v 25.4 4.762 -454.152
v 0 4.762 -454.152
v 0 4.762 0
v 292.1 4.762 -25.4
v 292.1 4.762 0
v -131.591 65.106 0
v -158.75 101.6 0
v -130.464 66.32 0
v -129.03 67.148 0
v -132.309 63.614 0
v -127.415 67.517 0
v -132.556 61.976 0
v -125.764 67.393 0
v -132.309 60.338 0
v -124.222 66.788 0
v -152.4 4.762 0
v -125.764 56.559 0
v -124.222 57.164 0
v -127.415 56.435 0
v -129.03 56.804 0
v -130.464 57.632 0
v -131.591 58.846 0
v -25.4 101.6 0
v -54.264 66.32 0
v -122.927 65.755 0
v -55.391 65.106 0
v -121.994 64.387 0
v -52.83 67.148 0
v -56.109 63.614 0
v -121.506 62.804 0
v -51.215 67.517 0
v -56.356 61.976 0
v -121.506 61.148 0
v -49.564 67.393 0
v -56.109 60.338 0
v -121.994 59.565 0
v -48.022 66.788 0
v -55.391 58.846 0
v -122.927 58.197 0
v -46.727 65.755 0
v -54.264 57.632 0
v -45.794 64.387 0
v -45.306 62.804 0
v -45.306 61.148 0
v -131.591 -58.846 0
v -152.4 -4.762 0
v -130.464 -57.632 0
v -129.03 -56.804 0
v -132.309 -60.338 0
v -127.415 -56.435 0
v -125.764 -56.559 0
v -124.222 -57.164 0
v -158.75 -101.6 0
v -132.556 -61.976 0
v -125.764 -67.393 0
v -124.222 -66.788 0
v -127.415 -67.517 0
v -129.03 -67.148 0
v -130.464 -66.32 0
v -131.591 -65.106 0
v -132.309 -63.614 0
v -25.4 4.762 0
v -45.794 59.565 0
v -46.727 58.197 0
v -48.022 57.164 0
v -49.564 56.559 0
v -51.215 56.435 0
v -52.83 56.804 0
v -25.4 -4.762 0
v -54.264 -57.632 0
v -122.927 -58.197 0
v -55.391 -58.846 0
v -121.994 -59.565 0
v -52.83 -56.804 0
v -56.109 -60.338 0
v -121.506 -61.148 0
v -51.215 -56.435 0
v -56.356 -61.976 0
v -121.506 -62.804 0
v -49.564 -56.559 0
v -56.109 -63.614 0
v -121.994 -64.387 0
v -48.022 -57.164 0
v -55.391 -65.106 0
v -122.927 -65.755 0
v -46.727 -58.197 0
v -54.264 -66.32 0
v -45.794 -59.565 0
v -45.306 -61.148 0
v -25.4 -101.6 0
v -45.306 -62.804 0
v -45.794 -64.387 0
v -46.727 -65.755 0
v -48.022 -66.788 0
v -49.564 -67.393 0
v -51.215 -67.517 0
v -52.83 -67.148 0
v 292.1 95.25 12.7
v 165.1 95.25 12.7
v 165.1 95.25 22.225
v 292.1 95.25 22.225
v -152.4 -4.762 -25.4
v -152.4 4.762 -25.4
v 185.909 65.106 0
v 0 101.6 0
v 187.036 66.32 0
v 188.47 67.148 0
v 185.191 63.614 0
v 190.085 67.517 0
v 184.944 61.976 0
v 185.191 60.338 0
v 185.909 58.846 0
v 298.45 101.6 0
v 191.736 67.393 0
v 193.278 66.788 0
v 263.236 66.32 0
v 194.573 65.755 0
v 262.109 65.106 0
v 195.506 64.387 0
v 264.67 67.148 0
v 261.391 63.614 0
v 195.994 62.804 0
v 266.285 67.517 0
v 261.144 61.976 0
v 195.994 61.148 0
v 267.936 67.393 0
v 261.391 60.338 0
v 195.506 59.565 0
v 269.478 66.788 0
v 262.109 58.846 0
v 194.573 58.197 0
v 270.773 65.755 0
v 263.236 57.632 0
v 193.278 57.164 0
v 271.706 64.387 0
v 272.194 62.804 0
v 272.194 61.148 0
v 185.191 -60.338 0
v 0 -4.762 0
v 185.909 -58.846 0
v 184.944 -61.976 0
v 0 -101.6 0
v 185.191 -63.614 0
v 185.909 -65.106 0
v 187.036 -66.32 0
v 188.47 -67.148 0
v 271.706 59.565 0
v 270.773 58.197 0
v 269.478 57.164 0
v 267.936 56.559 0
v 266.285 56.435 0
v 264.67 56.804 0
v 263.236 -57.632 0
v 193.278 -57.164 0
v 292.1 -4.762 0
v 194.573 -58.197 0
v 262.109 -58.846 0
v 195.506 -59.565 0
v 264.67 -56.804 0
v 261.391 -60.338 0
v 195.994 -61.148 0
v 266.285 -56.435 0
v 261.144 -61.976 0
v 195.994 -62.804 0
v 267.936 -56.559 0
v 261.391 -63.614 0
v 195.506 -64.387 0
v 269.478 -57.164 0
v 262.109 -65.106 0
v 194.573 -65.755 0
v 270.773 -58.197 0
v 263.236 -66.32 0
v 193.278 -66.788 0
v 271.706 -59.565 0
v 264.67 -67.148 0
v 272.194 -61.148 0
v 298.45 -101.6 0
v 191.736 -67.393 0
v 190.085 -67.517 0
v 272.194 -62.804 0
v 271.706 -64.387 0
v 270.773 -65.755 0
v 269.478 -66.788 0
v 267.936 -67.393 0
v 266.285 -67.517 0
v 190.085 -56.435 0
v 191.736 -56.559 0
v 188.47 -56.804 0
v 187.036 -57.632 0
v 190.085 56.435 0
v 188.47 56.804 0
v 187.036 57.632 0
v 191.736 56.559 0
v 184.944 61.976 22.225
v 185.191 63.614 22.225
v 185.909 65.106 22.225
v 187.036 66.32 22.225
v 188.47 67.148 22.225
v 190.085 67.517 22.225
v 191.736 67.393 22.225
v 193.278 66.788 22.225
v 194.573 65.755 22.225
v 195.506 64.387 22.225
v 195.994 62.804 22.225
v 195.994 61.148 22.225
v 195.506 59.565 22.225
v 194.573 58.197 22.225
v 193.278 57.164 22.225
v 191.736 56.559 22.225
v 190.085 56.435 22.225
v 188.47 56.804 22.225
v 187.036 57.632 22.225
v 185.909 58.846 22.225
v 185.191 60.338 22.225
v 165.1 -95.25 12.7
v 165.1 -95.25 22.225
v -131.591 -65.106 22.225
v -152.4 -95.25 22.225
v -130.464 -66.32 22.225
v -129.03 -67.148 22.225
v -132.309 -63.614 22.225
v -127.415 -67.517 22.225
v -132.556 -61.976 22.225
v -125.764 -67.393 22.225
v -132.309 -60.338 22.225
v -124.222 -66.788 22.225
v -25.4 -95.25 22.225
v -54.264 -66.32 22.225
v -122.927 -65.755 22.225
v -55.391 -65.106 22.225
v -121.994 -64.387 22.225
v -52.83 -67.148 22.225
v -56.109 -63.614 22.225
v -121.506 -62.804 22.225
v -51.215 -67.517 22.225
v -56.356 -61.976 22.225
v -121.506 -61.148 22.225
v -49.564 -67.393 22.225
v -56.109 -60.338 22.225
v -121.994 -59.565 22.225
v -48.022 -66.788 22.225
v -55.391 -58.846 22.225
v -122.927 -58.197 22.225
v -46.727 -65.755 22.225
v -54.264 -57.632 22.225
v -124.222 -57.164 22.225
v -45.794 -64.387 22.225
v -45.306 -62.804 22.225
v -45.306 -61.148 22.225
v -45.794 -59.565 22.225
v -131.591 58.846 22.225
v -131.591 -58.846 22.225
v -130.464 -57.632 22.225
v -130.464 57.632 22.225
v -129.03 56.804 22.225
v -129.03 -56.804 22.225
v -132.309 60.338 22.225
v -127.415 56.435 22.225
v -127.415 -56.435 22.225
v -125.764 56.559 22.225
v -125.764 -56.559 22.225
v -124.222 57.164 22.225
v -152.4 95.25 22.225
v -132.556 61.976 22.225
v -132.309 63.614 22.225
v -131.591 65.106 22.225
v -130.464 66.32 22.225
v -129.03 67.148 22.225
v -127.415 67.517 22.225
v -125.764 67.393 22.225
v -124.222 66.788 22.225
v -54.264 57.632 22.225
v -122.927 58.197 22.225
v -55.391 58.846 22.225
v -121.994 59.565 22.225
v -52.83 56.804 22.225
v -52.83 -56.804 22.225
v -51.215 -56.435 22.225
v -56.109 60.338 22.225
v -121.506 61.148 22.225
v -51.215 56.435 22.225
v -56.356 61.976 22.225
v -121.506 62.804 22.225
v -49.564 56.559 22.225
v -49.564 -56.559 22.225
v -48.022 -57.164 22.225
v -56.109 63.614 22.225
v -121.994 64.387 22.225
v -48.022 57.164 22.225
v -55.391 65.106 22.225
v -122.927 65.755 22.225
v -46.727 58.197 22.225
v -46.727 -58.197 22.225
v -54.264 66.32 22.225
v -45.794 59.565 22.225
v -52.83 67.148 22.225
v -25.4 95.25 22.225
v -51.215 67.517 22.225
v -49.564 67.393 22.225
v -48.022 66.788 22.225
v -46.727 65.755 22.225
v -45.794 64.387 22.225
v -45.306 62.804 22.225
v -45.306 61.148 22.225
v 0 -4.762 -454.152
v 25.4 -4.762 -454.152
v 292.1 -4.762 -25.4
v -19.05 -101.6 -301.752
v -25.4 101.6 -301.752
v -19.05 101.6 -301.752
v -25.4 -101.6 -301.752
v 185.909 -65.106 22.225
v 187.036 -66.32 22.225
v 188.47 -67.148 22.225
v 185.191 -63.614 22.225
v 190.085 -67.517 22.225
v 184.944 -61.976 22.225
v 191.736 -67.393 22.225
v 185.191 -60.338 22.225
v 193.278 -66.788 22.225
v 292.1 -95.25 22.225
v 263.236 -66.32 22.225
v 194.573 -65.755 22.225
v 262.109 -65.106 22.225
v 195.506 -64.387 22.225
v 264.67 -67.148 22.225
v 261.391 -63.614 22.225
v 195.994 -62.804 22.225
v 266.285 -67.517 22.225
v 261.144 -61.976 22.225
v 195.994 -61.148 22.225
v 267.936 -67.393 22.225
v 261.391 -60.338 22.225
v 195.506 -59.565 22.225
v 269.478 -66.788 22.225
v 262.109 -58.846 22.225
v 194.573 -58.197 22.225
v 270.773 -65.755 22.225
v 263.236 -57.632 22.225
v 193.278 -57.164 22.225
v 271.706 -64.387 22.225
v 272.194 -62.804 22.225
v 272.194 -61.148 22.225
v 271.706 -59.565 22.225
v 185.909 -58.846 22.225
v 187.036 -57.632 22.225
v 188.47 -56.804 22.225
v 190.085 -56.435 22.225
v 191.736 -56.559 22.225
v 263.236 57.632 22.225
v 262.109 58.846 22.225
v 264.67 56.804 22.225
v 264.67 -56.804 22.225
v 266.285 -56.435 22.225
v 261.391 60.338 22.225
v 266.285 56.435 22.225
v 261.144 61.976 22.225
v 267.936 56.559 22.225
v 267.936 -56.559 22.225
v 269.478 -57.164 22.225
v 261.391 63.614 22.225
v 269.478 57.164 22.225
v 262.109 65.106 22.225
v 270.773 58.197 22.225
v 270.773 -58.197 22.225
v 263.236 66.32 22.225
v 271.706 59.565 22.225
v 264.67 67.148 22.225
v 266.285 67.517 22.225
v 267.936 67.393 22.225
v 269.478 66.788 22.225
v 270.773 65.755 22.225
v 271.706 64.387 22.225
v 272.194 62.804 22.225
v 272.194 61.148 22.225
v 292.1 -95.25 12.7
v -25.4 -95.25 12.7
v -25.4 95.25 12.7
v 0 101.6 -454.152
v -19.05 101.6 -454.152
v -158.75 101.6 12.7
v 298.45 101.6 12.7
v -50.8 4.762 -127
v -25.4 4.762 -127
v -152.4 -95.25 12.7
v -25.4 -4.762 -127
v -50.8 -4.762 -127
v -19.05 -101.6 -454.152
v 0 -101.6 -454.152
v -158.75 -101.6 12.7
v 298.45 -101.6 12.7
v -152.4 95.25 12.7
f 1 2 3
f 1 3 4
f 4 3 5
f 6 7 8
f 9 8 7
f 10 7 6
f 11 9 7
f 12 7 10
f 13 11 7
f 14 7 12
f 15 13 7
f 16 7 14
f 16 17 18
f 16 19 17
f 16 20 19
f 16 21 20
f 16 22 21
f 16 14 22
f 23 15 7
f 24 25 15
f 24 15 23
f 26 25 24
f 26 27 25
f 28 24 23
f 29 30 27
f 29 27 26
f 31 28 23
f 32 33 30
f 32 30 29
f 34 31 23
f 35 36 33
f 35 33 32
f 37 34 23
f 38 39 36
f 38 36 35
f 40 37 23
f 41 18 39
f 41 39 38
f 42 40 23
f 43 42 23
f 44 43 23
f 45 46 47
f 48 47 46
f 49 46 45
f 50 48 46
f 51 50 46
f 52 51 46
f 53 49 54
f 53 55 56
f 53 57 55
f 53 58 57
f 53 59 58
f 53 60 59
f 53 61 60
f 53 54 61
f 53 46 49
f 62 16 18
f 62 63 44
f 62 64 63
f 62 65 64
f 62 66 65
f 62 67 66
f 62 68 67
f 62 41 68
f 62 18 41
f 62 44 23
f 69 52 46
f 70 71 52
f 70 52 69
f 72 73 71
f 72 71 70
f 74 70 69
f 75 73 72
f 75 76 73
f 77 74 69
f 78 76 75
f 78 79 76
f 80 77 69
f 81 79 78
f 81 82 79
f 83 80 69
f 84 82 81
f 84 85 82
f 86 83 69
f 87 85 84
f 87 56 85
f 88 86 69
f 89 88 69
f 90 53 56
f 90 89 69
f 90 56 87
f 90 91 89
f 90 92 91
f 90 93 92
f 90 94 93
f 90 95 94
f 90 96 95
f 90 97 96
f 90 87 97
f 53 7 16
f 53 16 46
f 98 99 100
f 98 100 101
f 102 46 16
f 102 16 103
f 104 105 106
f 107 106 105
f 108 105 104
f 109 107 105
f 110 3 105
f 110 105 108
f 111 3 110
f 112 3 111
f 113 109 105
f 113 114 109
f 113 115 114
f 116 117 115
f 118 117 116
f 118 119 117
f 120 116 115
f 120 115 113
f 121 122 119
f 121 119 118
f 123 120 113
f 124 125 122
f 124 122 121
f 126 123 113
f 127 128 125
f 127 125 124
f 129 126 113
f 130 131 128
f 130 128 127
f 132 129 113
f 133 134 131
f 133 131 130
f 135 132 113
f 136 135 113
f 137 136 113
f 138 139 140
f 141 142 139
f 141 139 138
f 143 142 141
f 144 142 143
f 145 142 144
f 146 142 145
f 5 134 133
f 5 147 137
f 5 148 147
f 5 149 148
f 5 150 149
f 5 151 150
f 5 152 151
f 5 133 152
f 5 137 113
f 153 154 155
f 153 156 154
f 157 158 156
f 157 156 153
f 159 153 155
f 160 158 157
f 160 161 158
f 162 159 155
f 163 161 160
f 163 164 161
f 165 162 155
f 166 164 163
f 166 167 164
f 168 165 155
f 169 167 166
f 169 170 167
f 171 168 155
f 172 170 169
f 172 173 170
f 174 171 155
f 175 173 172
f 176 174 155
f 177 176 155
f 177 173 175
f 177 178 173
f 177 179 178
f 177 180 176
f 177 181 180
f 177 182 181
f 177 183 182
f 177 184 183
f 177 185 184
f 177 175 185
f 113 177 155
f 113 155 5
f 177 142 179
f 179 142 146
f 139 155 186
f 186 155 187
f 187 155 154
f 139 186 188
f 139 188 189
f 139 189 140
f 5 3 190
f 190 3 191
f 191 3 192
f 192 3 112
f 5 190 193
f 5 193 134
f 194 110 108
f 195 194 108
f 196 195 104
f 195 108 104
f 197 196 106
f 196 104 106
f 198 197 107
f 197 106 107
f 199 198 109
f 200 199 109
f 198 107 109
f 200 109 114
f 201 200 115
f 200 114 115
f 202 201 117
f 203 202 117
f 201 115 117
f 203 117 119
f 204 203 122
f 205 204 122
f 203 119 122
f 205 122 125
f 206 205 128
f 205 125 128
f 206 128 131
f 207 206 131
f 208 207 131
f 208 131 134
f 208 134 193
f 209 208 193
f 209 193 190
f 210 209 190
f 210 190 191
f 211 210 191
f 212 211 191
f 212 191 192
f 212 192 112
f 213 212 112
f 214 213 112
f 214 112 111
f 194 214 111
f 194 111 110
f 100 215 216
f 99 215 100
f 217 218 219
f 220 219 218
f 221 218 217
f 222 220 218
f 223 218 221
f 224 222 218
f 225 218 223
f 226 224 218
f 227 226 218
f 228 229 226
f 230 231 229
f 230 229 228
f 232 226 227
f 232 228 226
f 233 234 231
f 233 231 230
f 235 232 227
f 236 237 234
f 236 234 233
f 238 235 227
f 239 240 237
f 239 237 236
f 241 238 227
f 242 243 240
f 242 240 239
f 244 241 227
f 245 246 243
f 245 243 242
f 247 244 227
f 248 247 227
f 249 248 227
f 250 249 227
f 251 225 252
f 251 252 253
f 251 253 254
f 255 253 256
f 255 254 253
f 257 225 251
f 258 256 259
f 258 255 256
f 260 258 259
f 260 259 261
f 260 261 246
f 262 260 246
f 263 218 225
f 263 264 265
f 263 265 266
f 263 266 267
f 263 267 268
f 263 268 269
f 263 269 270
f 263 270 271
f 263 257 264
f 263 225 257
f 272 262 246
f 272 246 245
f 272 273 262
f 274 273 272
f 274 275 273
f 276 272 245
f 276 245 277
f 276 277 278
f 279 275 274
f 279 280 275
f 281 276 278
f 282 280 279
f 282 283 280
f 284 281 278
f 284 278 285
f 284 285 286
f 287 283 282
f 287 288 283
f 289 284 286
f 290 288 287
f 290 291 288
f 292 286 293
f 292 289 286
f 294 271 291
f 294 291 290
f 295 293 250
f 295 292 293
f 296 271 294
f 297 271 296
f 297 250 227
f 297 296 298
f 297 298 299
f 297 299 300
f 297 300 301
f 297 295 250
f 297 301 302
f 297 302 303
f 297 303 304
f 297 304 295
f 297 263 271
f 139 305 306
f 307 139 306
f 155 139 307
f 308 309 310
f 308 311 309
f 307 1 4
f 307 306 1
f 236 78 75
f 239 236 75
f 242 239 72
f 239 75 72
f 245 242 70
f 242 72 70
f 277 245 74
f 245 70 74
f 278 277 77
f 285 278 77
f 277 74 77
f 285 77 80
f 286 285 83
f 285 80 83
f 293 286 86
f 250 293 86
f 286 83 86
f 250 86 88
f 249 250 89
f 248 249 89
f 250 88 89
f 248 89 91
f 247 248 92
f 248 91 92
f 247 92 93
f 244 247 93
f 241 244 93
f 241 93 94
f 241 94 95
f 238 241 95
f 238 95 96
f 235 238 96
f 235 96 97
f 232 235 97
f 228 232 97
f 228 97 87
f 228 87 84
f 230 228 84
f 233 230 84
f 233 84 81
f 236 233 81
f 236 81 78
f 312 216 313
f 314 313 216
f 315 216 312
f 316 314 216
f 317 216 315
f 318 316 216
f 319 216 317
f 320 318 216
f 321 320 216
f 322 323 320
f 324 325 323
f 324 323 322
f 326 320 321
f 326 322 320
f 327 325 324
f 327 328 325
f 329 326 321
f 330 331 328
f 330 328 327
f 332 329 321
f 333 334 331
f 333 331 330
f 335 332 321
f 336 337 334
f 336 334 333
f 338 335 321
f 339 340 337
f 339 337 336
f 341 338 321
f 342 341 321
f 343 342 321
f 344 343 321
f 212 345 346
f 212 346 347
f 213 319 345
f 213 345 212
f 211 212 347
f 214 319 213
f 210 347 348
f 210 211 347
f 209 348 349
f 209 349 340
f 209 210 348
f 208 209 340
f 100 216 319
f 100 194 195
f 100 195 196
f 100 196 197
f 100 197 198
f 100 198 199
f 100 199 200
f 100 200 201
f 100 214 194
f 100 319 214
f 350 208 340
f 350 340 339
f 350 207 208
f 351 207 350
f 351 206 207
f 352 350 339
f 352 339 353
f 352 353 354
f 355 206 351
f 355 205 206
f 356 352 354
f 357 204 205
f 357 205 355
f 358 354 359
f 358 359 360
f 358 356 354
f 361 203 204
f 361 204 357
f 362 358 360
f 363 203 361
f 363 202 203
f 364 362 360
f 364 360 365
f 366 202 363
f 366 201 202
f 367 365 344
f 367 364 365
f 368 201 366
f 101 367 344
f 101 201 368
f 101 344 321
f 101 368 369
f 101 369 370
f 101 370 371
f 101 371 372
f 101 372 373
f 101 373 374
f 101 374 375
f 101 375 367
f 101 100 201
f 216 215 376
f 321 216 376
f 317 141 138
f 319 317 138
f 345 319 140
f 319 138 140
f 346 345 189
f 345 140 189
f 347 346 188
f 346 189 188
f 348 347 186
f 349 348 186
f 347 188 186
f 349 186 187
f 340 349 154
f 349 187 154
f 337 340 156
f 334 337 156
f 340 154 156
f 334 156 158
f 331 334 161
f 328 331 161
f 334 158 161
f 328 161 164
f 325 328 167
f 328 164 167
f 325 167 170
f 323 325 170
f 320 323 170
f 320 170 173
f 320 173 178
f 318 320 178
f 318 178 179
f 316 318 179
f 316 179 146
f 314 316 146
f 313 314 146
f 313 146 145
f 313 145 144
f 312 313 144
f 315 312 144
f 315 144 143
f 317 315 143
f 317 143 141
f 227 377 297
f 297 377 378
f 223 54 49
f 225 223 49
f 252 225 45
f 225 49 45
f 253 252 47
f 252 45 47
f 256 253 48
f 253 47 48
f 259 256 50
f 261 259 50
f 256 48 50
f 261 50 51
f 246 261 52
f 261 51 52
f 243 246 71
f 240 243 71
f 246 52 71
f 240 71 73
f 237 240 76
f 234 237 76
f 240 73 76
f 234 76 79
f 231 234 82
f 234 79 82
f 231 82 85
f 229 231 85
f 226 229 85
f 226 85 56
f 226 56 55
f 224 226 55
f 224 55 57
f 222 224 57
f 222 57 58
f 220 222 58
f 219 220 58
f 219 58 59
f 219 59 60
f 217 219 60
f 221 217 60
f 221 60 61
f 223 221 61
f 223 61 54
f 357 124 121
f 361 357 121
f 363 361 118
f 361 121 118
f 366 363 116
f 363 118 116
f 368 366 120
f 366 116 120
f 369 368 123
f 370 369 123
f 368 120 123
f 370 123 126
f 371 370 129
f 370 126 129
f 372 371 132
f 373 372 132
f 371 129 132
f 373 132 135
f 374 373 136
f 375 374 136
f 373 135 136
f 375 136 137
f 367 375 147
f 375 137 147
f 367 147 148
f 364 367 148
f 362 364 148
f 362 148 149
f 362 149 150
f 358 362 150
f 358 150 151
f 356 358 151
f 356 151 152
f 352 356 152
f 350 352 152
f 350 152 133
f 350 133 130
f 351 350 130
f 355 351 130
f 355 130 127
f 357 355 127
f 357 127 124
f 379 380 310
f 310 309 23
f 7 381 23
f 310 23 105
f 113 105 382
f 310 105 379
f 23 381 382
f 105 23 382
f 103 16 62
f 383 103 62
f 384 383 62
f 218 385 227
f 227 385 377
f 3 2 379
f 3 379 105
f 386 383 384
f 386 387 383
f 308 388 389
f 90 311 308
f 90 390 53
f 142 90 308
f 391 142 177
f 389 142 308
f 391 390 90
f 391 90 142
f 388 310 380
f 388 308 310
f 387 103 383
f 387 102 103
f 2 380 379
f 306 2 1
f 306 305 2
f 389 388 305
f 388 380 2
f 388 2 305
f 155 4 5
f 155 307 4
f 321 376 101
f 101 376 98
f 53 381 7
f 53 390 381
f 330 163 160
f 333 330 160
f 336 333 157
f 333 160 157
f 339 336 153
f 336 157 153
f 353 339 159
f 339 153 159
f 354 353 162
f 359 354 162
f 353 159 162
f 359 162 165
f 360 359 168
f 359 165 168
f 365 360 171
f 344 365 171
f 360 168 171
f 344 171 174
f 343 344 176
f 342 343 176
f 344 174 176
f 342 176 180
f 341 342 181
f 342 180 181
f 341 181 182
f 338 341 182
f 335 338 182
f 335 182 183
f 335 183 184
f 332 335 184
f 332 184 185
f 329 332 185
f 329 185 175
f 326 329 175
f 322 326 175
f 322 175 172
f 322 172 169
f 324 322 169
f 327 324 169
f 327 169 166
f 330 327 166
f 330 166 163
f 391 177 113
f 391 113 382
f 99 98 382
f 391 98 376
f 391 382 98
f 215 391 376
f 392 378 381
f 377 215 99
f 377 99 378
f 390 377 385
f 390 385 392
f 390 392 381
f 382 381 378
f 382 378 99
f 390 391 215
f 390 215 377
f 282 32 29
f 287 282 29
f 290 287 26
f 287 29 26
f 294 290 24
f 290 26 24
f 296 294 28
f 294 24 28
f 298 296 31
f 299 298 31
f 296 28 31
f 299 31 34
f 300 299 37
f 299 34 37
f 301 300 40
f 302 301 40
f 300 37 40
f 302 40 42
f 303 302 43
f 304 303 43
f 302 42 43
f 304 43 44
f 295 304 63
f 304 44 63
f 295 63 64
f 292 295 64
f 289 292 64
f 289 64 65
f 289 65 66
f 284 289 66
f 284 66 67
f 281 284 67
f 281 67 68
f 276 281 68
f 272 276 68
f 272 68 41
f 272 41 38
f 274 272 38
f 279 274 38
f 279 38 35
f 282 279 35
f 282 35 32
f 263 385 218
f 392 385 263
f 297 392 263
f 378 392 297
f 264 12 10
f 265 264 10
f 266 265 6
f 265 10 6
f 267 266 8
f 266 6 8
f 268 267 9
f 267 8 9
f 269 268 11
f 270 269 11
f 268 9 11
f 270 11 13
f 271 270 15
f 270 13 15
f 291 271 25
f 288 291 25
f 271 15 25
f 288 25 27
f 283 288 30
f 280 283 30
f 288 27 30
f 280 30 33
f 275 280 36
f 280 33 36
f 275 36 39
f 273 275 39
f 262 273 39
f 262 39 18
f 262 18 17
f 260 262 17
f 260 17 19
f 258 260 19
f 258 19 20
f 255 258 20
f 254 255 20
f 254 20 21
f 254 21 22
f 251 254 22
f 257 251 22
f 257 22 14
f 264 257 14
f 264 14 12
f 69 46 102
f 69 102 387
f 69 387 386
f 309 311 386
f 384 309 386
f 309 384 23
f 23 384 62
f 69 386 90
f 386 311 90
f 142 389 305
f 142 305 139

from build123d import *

# Parameters (mm, degrees)
F0_W     = 6.35
F0_H     = 301.752
F1_DEPTH = 101.6
F3_DEPTH = 101.6
F5_DEPTH = 4.7625
F7_DEPTH = 4.7625
F8_W     = 127
F8_H     = 190.5
F9_DEPTH = 9.525
F11_D    = 11.1125


with BuildPart() as f1:
    # F0 (on Front) → F1 (new body, symmetric)
    with BuildSketch(Plane.XZ):
        Polygon((-19.05, -454.152), (0, -454.152), (0, 0), (-19.05, 0), (-19.05, -301.752), align=None)
        with Locations((-22.225, -150.876)):
            Rectangle(F0_W, F0_H)
    extrude(amount=F1_DEPTH, both=True)

    # F2 (on Front) → F3 (join, symmetric)
    with BuildSketch(Plane.XZ):
        Polygon((-158.75, 0), (0, 0), (298.45, 0), (298.45, 12.7), (-158.75, 12.7), align=None)
    extrude(amount=F3_DEPTH, both=True)

    # F4 (on Front) → F5 (join, symmetric)
    with BuildSketch(Plane.XZ):
        Polygon((-25.4, -127), (-25.4, 0), (-152.4, 0), (-152.4, -25.4), (-50.8, -127), align=None)
    extrude(amount=F5_DEPTH, both=True)

    # F6 (on Front) → F7 (join, symmetric)
    with BuildSketch(Plane.XZ):
        Polygon((292.1, 0), (0, 0), (0, -454.152), (25.4, -454.152), (292.1, -25.4), align=None)
    extrude(amount=F7_DEPTH, both=True)

    # F8 (on face) → F9 (join)
    with BuildSketch(Plane.XY.offset(12.7)):
        with Locations((-88.9, 0)):
            Rectangle(F8_W, F8_H)
        with Locations((228.6, 0)):
            Rectangle(F8_W, F8_H)
    extrude(amount=F9_DEPTH)

    # F11 (through all)
    with Locations(Plane.XY.offset(22.225)):
        with Locations((-127, 61.976), (-50.8, 61.976), (-127, -61.976), (-50.8, -61.976), (190.5, 61.976), (266.7, 61.976), (266.7, -61.976), (190.5, -61.976)):
            Hole(F11_D / 2)


solid = f1.part
